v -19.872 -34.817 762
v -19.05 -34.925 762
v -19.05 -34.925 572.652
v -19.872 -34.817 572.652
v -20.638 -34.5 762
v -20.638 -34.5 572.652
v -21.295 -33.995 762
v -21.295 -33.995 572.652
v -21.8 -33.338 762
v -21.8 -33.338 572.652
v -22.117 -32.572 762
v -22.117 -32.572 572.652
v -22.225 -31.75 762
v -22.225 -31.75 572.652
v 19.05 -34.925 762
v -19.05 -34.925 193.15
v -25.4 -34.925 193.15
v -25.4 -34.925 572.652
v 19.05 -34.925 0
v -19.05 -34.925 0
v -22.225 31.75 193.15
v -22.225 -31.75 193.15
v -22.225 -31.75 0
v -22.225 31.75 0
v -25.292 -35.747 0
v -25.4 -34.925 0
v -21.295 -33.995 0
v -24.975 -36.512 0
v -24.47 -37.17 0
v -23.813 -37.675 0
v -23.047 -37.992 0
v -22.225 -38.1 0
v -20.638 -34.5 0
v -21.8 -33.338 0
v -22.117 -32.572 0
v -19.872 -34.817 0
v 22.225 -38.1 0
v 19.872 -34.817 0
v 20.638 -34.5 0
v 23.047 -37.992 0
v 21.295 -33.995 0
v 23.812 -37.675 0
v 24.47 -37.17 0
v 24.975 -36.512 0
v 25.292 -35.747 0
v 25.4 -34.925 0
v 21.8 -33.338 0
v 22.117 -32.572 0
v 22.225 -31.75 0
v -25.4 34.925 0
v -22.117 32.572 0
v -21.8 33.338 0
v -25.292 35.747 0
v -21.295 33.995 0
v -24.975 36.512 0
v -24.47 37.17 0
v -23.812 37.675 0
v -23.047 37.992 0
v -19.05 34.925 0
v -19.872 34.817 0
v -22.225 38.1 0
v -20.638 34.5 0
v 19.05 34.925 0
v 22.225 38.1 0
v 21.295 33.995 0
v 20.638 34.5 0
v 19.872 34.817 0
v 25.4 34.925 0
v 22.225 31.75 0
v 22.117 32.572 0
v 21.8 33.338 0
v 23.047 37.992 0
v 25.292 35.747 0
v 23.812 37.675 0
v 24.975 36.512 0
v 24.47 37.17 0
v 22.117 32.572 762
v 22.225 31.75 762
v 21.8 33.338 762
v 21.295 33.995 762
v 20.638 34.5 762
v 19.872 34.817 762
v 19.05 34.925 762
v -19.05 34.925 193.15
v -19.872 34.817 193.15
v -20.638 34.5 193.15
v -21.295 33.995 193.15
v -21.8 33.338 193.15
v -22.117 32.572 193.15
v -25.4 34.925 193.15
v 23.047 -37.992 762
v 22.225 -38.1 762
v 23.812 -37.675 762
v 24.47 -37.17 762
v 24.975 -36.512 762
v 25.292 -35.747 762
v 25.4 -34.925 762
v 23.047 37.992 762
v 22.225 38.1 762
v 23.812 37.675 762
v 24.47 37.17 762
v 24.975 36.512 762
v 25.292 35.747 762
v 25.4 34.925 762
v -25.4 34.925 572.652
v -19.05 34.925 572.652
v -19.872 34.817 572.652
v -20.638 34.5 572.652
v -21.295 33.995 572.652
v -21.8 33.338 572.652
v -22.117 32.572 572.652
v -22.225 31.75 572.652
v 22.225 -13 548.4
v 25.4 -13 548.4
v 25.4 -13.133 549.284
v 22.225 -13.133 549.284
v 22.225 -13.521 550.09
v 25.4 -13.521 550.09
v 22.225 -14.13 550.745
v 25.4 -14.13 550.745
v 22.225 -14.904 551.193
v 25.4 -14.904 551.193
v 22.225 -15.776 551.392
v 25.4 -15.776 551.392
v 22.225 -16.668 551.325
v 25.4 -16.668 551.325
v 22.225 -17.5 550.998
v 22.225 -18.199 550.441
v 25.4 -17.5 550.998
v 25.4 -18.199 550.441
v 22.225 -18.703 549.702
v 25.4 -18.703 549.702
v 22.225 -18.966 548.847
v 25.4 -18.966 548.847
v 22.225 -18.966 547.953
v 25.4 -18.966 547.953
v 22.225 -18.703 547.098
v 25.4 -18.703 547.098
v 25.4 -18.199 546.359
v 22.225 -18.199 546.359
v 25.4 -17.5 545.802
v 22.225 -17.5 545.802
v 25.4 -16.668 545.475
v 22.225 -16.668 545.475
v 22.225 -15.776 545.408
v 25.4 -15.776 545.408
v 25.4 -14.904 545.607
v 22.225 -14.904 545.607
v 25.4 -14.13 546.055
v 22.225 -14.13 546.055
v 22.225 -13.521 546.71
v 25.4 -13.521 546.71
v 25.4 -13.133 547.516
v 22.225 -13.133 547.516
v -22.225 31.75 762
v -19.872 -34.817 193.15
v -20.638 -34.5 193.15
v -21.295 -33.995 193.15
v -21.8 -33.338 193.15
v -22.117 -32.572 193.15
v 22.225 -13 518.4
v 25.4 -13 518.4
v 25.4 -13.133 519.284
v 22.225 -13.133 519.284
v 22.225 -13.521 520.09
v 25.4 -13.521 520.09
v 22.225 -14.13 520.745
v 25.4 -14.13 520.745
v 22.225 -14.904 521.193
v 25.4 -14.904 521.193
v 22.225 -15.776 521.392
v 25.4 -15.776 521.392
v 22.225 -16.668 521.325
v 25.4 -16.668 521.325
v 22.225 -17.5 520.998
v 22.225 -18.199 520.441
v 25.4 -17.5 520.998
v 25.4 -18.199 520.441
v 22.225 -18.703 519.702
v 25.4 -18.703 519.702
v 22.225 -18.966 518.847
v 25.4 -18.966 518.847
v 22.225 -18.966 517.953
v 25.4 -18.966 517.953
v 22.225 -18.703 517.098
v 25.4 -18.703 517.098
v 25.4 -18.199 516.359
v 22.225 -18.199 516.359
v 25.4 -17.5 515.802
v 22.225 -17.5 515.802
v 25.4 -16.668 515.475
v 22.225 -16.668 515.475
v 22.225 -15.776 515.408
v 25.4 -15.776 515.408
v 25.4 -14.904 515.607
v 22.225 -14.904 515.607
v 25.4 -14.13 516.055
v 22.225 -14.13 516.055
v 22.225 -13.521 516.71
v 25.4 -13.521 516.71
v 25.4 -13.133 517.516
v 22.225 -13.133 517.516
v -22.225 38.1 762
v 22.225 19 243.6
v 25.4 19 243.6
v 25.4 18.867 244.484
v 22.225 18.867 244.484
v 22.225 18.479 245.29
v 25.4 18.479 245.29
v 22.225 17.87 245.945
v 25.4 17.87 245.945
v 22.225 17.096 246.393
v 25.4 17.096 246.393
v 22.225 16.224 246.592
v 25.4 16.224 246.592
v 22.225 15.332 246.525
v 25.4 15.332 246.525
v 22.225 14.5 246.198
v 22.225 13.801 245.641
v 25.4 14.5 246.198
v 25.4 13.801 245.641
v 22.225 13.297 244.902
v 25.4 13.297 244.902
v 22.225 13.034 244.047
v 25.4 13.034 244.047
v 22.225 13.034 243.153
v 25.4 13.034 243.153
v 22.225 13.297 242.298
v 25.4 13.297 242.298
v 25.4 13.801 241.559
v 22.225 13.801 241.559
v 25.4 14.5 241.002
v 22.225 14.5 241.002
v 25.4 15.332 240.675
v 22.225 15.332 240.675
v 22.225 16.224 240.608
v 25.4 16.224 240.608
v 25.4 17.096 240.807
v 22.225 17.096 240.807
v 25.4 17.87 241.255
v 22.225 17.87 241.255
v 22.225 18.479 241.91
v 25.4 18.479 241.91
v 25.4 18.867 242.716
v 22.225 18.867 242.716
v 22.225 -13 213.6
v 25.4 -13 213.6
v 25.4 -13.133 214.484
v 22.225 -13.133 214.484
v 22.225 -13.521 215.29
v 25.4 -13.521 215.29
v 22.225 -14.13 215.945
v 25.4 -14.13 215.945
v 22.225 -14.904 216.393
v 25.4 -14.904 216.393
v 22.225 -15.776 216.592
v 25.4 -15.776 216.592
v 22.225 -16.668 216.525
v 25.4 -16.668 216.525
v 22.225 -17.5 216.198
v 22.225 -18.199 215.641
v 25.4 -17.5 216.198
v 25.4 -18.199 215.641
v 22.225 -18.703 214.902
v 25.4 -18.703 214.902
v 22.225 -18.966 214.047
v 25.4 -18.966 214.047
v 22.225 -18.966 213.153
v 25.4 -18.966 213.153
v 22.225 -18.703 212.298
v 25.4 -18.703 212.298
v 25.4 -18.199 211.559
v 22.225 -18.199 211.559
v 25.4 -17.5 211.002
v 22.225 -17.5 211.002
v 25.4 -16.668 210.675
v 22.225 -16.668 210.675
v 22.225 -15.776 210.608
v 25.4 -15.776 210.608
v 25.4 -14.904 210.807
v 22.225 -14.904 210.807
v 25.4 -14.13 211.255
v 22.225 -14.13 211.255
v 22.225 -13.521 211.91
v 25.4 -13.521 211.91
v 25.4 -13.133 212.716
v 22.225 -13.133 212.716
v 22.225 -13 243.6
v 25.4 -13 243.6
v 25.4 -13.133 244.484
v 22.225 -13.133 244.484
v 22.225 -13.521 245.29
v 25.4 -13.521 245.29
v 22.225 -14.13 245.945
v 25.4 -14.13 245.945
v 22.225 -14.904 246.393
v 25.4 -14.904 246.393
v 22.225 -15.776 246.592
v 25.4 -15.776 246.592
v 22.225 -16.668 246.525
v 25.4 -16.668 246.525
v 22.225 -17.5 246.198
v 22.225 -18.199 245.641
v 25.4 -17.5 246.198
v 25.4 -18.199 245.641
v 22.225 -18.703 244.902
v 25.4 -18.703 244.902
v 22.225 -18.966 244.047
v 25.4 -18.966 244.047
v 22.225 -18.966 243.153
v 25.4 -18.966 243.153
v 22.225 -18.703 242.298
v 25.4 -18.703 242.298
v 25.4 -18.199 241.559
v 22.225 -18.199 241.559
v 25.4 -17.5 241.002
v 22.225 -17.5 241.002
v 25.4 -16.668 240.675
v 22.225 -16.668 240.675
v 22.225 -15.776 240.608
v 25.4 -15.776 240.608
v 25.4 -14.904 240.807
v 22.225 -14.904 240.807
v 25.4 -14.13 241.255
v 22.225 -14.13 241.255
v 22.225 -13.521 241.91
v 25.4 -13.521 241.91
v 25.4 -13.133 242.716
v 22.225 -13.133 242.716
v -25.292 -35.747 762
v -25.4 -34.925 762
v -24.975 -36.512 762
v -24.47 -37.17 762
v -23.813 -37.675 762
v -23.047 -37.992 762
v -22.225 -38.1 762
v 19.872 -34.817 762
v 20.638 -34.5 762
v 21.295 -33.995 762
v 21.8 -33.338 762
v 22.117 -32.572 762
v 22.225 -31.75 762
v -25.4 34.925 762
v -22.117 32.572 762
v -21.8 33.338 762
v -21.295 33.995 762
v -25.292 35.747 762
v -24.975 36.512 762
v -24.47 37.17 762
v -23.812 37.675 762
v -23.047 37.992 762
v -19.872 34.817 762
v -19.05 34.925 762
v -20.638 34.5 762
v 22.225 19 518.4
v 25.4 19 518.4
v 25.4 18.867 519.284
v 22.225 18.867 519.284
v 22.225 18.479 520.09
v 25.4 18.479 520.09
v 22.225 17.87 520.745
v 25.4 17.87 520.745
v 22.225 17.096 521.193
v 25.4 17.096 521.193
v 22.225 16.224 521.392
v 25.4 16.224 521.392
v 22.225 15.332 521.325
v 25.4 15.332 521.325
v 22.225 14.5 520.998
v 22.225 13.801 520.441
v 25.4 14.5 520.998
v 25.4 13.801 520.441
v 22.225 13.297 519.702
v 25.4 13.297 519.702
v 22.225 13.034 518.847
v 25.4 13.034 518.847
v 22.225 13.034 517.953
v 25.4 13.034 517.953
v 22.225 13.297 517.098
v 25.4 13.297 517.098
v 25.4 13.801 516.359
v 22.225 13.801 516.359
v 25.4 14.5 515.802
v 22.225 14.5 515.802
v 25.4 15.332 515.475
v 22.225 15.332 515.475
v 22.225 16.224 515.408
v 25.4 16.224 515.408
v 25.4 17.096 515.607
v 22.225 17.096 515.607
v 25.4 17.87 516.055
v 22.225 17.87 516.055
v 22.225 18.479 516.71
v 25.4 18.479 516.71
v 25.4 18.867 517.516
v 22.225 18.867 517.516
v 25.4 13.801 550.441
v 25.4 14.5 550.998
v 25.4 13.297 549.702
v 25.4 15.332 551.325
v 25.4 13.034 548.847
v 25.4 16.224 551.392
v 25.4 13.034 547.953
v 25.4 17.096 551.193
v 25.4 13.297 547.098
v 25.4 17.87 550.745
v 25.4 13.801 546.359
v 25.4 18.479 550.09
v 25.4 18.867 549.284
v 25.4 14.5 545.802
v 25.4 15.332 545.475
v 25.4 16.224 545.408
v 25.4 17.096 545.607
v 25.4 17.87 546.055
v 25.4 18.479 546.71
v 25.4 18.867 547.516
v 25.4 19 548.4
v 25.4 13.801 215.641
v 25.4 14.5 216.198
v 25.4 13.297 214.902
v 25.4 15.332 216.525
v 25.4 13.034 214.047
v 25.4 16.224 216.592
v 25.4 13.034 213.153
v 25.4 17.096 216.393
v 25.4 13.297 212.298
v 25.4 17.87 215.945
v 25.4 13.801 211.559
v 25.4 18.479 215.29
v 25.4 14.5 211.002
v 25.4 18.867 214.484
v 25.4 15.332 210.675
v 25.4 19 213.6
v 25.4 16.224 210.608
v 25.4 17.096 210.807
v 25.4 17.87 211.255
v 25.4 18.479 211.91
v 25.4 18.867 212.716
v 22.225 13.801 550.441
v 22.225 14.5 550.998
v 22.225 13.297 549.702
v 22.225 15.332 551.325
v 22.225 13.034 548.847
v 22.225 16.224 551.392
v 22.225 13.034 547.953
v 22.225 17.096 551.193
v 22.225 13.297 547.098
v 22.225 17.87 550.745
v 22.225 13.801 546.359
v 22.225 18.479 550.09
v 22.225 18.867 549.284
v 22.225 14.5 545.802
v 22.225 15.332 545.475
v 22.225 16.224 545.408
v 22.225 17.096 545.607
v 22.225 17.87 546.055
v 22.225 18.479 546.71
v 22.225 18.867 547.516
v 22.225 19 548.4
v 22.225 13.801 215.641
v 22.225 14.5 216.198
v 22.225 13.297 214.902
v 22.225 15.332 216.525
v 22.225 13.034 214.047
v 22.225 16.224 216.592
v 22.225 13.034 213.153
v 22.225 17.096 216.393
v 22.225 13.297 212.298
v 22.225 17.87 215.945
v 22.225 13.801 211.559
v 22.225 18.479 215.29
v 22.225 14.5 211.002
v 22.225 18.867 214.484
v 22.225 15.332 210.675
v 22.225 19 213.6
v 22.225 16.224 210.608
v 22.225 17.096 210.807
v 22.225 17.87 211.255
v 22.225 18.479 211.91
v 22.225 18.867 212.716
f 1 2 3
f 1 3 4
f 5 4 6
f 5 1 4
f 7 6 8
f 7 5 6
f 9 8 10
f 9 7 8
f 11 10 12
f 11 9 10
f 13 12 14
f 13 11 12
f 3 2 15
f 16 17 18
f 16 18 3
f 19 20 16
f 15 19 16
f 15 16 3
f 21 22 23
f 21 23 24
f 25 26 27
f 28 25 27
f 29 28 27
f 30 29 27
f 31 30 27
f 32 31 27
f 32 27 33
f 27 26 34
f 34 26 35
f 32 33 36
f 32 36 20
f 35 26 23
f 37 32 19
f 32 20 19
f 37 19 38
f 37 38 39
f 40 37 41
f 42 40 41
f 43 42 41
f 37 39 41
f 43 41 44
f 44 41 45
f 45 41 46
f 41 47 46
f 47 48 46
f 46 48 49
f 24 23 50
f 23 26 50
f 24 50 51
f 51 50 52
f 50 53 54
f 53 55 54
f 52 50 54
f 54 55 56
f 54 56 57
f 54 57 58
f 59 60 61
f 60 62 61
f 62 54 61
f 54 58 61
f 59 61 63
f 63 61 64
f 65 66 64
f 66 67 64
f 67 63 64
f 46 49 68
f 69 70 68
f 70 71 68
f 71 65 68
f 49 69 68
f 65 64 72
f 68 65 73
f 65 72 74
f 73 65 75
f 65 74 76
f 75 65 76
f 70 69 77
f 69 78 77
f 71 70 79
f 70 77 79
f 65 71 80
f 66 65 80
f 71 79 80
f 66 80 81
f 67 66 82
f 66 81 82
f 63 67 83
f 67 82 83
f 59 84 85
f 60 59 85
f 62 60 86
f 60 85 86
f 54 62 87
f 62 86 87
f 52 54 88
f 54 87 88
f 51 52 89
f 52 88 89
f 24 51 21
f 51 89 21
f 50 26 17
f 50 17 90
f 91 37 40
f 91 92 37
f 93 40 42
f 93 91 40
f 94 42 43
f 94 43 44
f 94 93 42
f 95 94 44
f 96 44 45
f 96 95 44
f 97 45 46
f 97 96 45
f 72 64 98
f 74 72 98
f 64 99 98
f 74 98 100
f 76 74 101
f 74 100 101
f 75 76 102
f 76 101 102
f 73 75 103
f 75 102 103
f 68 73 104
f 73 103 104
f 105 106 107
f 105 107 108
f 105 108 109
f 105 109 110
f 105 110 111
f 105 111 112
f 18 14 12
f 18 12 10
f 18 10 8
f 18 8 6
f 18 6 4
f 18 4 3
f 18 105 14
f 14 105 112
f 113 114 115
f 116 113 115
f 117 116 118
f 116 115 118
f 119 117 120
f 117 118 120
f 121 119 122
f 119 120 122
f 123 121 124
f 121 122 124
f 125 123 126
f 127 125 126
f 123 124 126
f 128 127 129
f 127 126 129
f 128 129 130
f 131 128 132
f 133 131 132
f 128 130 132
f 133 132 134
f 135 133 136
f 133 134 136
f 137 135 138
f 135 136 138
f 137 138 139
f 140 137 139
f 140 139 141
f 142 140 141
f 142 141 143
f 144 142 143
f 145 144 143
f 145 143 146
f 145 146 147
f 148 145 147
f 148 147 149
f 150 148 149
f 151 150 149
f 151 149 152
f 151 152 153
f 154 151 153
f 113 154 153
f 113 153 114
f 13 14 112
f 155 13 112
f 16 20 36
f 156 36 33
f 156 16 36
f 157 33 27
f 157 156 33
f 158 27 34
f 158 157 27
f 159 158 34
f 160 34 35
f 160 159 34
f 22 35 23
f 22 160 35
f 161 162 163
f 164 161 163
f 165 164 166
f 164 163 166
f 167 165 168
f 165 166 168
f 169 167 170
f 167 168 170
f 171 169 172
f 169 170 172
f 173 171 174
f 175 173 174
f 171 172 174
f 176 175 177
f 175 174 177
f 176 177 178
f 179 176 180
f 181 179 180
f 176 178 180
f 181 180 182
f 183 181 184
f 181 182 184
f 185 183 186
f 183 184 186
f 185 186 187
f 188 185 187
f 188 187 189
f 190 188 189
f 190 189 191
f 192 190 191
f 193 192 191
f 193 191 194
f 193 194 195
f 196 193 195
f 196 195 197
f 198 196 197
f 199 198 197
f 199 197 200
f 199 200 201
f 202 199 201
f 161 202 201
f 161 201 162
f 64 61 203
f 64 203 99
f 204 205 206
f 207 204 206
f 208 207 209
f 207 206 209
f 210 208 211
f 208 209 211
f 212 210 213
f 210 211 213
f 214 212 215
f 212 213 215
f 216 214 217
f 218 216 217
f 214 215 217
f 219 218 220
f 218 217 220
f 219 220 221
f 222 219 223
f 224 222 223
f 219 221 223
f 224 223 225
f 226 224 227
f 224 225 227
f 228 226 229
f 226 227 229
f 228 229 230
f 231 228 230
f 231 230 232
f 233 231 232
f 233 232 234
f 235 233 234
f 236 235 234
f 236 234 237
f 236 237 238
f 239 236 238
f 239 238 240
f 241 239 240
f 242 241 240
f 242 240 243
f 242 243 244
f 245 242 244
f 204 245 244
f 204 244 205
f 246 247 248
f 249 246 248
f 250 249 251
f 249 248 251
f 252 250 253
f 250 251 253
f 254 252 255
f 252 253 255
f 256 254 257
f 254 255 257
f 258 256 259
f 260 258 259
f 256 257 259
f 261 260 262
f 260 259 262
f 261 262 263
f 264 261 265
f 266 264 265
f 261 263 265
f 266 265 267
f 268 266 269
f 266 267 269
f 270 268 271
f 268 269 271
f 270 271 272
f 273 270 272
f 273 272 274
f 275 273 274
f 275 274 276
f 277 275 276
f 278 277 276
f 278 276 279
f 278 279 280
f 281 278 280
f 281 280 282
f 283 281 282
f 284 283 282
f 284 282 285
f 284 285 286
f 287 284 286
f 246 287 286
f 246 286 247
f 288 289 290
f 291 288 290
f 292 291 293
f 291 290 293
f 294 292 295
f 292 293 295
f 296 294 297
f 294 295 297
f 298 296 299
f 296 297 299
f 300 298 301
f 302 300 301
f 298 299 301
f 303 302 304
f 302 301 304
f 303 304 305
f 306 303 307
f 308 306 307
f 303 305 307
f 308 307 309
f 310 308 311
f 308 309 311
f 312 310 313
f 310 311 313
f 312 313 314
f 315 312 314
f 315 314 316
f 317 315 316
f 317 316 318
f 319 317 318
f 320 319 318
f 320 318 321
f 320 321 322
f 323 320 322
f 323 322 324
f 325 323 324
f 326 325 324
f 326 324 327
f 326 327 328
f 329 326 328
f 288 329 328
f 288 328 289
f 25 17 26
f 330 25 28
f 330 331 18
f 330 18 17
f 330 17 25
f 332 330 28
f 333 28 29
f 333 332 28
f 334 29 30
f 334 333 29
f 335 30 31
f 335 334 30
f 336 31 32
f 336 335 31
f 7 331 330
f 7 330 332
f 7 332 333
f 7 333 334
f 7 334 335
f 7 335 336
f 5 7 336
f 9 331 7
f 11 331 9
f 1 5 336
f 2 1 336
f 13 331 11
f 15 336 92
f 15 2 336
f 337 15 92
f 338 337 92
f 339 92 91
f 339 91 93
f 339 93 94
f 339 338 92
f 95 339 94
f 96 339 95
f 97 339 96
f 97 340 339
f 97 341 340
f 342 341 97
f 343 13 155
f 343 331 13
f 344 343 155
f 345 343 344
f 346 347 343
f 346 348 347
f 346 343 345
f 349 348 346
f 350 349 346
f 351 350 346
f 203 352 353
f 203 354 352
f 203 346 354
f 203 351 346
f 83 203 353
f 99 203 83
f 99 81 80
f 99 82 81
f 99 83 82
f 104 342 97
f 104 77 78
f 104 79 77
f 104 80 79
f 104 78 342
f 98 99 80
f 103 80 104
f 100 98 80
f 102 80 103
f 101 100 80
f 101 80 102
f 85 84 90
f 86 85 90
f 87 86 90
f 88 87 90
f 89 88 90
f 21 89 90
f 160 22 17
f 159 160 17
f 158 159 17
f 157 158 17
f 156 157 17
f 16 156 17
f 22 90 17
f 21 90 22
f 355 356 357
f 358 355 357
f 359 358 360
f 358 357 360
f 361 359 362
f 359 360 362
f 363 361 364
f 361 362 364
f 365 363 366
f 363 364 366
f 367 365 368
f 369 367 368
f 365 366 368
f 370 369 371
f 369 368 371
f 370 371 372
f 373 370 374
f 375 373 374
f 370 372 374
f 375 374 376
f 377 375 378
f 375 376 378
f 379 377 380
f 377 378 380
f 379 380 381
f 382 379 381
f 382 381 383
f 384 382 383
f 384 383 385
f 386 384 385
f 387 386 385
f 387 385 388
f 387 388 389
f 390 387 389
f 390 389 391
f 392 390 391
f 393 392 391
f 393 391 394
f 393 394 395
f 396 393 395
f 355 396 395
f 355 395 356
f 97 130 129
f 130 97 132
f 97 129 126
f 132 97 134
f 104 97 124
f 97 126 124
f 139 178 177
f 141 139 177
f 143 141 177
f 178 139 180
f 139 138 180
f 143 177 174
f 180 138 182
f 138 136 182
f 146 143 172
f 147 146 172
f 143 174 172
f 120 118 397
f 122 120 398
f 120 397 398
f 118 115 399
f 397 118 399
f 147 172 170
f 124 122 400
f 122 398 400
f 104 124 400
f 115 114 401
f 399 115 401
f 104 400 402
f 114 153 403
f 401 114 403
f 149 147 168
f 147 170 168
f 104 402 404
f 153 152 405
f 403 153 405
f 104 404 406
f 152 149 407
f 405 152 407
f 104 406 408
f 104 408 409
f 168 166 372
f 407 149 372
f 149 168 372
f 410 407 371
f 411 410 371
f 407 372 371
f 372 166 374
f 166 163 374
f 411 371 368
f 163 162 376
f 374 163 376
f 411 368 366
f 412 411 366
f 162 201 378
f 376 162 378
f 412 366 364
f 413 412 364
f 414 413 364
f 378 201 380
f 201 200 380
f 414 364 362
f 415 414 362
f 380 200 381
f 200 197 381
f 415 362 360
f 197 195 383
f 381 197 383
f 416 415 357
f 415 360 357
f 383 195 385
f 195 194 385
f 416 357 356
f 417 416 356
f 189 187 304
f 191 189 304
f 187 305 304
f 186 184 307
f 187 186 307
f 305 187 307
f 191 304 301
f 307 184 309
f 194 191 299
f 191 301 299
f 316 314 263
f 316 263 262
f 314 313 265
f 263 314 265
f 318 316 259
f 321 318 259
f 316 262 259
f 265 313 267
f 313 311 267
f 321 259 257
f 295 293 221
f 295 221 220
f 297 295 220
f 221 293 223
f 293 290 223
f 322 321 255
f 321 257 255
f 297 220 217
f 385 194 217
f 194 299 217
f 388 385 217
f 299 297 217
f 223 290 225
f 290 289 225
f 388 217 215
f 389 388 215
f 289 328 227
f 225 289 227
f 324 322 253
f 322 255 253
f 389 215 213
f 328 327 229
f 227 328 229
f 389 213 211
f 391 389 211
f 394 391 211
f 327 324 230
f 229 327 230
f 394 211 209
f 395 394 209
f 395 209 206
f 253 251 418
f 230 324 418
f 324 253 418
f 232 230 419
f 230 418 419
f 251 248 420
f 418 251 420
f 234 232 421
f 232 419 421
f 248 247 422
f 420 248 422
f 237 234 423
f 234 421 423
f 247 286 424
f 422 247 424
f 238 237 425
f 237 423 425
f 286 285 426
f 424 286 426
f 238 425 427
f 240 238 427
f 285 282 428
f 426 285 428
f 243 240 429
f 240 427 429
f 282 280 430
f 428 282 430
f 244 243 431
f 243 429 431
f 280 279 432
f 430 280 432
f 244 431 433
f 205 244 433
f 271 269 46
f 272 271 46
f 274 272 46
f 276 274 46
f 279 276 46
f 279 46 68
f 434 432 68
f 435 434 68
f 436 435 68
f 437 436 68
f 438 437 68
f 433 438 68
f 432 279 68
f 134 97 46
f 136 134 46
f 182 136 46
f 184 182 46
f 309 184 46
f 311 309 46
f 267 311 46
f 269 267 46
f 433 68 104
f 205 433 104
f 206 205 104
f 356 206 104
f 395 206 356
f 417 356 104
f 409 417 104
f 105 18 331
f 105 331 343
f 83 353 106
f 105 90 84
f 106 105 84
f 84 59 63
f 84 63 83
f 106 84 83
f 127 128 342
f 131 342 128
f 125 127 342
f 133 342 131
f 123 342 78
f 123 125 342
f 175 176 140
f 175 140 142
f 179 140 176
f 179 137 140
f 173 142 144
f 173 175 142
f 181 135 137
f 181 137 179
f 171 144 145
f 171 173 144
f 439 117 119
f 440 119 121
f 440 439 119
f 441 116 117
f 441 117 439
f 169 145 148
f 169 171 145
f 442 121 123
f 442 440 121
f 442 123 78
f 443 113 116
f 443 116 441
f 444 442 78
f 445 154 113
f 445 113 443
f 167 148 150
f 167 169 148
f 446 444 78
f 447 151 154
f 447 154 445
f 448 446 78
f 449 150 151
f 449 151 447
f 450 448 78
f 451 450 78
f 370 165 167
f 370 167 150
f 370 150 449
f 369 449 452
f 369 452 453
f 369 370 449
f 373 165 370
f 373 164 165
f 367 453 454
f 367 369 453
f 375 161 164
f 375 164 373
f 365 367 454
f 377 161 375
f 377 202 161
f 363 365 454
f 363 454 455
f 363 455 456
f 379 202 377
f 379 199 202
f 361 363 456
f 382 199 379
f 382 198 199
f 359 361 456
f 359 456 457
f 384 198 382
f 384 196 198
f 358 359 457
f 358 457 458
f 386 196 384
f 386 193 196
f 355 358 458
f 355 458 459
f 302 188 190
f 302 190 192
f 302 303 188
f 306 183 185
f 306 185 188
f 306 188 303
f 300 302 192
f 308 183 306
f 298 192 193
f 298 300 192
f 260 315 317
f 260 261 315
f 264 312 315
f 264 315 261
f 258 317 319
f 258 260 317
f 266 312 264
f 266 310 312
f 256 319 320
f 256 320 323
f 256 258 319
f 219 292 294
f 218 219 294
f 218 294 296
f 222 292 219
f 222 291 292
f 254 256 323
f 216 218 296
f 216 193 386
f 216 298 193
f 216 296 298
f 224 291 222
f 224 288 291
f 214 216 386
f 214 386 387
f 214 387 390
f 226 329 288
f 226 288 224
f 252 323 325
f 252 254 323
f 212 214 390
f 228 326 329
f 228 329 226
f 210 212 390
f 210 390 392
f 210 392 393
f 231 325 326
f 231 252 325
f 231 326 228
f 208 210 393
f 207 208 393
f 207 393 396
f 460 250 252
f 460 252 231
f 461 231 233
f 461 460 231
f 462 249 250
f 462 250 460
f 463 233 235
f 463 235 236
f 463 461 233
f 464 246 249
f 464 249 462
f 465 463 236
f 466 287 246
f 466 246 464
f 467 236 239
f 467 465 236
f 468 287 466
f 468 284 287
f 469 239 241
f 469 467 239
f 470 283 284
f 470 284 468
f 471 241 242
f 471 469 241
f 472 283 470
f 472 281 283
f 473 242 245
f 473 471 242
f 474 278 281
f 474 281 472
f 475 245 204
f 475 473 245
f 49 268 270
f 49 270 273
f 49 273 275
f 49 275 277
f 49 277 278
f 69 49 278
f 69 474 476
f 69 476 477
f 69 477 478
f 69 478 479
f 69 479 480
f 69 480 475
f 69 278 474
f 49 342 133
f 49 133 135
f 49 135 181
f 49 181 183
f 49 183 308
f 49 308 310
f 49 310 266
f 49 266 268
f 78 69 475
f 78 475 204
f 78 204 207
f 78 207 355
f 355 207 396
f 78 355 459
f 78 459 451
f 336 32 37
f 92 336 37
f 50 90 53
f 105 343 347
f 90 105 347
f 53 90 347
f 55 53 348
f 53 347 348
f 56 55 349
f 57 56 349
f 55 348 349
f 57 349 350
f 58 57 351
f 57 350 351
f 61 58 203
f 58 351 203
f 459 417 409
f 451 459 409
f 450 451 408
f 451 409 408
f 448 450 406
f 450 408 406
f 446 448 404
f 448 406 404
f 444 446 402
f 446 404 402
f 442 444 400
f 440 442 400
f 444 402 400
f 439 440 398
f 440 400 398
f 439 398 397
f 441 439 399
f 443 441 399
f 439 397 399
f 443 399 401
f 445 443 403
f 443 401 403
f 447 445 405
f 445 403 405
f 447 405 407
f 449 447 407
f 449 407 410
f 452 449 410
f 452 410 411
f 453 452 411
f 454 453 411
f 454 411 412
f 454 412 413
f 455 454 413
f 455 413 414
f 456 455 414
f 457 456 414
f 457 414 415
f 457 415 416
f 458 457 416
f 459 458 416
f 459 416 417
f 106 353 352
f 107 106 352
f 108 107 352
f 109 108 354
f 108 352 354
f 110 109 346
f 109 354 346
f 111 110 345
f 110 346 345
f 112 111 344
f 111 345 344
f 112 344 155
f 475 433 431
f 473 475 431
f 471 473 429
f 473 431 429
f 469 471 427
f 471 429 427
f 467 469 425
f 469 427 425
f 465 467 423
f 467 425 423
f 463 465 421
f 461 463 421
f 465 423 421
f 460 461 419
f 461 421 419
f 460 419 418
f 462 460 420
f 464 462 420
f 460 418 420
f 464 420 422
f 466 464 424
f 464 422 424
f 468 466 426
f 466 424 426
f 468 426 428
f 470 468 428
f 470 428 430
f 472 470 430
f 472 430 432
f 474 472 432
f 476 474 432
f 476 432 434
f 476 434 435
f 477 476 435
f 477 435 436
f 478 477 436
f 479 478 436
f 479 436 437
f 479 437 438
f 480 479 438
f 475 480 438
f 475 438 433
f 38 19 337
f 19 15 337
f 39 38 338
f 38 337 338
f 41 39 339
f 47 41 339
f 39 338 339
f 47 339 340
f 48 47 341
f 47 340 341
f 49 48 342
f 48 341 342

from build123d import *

# Parameters (mm, degrees)
F0_W     = 50.8
F0_H     = 76.2
F0_W_2   = 44.45
F0_H_2   = 69.85
F2_DEPTH = 762
F3_R     = 3.175
F4_R     = 3
F5_DEPTH = 50.801
F6_W     = 69.85
F6_H     = 379.5014
F6_R     = 3
F7_DEPTH = 25.4


# Not quite as in the source:
# - a variable given as a bare number and used for a length is read in inches; the dataset says mm whatever the document's units were


with BuildPart() as f2:
    # F0 (on Top) → F2 (new body)
    with BuildSketch(Plane.XY):
        Rectangle(F0_W, F0_H)
        Rectangle(F0_W_2, F0_H_2, mode=Mode.SUBTRACT)
    extrude(amount=F2_DEPTH)

    # F3
    f3_edges = [f2.edges().sort_by_distance(p)[0] for p in [
        (-22.225, 34.925, 381),
        (22.225, 34.925, 381),
        (22.225, -34.925, 381),
        (-22.225, -34.925, 381),
        (25.4, 38.1, 381),
        (-25.4, 38.1, 381),
        (25.4, -38.1, 381),
        (-25.4, -38.1, 381),
    ]]
    fillet(f3_edges, radius=F3_R)

    # F4 (on face) → F5 (cut, through all)
    with BuildSketch(Plane.YZ.offset(25.4)):
        with Locations((-16, 213.6)):
            Circle(F4_R)
        with Locations((-16, 243.6)):
            Circle(F4_R)
        with Locations((16, 243.6)):
            Circle(F4_R)
        with Locations((16, 213.6)):
            Circle(F4_R)
        with Locations((-16, 518.4)):
            Circle(F4_R)
        with Locations((-16, 548.4)):
            Circle(F4_R)
        with Locations((16, 518.4)):
            Circle(F4_R)
        with Locations((16, 548.4)):
            Circle(F4_R)
    extrude(amount=-F5_DEPTH, mode=Mode.SUBTRACT)

    # F6 (on face) → F7 (cut)
    with BuildSketch(Plane(origin=(-25.4, 0, 0), x_dir=(0, -1, 0), z_dir=(-1, 0, 0))):
        with Locations((0, 382.9008626968)):
            Rectangle(F6_W, F6_H)
        with Locations((-16, 213.6)):
            Circle(F6_R, mode=Mode.SUBTRACT)
        with Locations((-16, 243.6)):
            Circle(F6_R, mode=Mode.SUBTRACT)
        with Locations((16, 213.6)):
            Circle(F6_R, mode=Mode.SUBTRACT)
        with Locations((16, 243.6)):
            Circle(F6_R, mode=Mode.SUBTRACT)
        with Locations((-16, 518.4)):
            Circle(F6_R, mode=Mode.SUBTRACT)
        with Locations((-16, 548.4)):
            Circle(F6_R, mode=Mode.SUBTRACT)
        with Locations((16, 518.4)):
            Circle(F6_R, mode=Mode.SUBTRACT)
        with Locations((16, 548.4)):
            Circle(F6_R, mode=Mode.SUBTRACT)
    extrude(amount=-F7_DEPTH, mode=Mode.SUBTRACT)


solid = f2.part
